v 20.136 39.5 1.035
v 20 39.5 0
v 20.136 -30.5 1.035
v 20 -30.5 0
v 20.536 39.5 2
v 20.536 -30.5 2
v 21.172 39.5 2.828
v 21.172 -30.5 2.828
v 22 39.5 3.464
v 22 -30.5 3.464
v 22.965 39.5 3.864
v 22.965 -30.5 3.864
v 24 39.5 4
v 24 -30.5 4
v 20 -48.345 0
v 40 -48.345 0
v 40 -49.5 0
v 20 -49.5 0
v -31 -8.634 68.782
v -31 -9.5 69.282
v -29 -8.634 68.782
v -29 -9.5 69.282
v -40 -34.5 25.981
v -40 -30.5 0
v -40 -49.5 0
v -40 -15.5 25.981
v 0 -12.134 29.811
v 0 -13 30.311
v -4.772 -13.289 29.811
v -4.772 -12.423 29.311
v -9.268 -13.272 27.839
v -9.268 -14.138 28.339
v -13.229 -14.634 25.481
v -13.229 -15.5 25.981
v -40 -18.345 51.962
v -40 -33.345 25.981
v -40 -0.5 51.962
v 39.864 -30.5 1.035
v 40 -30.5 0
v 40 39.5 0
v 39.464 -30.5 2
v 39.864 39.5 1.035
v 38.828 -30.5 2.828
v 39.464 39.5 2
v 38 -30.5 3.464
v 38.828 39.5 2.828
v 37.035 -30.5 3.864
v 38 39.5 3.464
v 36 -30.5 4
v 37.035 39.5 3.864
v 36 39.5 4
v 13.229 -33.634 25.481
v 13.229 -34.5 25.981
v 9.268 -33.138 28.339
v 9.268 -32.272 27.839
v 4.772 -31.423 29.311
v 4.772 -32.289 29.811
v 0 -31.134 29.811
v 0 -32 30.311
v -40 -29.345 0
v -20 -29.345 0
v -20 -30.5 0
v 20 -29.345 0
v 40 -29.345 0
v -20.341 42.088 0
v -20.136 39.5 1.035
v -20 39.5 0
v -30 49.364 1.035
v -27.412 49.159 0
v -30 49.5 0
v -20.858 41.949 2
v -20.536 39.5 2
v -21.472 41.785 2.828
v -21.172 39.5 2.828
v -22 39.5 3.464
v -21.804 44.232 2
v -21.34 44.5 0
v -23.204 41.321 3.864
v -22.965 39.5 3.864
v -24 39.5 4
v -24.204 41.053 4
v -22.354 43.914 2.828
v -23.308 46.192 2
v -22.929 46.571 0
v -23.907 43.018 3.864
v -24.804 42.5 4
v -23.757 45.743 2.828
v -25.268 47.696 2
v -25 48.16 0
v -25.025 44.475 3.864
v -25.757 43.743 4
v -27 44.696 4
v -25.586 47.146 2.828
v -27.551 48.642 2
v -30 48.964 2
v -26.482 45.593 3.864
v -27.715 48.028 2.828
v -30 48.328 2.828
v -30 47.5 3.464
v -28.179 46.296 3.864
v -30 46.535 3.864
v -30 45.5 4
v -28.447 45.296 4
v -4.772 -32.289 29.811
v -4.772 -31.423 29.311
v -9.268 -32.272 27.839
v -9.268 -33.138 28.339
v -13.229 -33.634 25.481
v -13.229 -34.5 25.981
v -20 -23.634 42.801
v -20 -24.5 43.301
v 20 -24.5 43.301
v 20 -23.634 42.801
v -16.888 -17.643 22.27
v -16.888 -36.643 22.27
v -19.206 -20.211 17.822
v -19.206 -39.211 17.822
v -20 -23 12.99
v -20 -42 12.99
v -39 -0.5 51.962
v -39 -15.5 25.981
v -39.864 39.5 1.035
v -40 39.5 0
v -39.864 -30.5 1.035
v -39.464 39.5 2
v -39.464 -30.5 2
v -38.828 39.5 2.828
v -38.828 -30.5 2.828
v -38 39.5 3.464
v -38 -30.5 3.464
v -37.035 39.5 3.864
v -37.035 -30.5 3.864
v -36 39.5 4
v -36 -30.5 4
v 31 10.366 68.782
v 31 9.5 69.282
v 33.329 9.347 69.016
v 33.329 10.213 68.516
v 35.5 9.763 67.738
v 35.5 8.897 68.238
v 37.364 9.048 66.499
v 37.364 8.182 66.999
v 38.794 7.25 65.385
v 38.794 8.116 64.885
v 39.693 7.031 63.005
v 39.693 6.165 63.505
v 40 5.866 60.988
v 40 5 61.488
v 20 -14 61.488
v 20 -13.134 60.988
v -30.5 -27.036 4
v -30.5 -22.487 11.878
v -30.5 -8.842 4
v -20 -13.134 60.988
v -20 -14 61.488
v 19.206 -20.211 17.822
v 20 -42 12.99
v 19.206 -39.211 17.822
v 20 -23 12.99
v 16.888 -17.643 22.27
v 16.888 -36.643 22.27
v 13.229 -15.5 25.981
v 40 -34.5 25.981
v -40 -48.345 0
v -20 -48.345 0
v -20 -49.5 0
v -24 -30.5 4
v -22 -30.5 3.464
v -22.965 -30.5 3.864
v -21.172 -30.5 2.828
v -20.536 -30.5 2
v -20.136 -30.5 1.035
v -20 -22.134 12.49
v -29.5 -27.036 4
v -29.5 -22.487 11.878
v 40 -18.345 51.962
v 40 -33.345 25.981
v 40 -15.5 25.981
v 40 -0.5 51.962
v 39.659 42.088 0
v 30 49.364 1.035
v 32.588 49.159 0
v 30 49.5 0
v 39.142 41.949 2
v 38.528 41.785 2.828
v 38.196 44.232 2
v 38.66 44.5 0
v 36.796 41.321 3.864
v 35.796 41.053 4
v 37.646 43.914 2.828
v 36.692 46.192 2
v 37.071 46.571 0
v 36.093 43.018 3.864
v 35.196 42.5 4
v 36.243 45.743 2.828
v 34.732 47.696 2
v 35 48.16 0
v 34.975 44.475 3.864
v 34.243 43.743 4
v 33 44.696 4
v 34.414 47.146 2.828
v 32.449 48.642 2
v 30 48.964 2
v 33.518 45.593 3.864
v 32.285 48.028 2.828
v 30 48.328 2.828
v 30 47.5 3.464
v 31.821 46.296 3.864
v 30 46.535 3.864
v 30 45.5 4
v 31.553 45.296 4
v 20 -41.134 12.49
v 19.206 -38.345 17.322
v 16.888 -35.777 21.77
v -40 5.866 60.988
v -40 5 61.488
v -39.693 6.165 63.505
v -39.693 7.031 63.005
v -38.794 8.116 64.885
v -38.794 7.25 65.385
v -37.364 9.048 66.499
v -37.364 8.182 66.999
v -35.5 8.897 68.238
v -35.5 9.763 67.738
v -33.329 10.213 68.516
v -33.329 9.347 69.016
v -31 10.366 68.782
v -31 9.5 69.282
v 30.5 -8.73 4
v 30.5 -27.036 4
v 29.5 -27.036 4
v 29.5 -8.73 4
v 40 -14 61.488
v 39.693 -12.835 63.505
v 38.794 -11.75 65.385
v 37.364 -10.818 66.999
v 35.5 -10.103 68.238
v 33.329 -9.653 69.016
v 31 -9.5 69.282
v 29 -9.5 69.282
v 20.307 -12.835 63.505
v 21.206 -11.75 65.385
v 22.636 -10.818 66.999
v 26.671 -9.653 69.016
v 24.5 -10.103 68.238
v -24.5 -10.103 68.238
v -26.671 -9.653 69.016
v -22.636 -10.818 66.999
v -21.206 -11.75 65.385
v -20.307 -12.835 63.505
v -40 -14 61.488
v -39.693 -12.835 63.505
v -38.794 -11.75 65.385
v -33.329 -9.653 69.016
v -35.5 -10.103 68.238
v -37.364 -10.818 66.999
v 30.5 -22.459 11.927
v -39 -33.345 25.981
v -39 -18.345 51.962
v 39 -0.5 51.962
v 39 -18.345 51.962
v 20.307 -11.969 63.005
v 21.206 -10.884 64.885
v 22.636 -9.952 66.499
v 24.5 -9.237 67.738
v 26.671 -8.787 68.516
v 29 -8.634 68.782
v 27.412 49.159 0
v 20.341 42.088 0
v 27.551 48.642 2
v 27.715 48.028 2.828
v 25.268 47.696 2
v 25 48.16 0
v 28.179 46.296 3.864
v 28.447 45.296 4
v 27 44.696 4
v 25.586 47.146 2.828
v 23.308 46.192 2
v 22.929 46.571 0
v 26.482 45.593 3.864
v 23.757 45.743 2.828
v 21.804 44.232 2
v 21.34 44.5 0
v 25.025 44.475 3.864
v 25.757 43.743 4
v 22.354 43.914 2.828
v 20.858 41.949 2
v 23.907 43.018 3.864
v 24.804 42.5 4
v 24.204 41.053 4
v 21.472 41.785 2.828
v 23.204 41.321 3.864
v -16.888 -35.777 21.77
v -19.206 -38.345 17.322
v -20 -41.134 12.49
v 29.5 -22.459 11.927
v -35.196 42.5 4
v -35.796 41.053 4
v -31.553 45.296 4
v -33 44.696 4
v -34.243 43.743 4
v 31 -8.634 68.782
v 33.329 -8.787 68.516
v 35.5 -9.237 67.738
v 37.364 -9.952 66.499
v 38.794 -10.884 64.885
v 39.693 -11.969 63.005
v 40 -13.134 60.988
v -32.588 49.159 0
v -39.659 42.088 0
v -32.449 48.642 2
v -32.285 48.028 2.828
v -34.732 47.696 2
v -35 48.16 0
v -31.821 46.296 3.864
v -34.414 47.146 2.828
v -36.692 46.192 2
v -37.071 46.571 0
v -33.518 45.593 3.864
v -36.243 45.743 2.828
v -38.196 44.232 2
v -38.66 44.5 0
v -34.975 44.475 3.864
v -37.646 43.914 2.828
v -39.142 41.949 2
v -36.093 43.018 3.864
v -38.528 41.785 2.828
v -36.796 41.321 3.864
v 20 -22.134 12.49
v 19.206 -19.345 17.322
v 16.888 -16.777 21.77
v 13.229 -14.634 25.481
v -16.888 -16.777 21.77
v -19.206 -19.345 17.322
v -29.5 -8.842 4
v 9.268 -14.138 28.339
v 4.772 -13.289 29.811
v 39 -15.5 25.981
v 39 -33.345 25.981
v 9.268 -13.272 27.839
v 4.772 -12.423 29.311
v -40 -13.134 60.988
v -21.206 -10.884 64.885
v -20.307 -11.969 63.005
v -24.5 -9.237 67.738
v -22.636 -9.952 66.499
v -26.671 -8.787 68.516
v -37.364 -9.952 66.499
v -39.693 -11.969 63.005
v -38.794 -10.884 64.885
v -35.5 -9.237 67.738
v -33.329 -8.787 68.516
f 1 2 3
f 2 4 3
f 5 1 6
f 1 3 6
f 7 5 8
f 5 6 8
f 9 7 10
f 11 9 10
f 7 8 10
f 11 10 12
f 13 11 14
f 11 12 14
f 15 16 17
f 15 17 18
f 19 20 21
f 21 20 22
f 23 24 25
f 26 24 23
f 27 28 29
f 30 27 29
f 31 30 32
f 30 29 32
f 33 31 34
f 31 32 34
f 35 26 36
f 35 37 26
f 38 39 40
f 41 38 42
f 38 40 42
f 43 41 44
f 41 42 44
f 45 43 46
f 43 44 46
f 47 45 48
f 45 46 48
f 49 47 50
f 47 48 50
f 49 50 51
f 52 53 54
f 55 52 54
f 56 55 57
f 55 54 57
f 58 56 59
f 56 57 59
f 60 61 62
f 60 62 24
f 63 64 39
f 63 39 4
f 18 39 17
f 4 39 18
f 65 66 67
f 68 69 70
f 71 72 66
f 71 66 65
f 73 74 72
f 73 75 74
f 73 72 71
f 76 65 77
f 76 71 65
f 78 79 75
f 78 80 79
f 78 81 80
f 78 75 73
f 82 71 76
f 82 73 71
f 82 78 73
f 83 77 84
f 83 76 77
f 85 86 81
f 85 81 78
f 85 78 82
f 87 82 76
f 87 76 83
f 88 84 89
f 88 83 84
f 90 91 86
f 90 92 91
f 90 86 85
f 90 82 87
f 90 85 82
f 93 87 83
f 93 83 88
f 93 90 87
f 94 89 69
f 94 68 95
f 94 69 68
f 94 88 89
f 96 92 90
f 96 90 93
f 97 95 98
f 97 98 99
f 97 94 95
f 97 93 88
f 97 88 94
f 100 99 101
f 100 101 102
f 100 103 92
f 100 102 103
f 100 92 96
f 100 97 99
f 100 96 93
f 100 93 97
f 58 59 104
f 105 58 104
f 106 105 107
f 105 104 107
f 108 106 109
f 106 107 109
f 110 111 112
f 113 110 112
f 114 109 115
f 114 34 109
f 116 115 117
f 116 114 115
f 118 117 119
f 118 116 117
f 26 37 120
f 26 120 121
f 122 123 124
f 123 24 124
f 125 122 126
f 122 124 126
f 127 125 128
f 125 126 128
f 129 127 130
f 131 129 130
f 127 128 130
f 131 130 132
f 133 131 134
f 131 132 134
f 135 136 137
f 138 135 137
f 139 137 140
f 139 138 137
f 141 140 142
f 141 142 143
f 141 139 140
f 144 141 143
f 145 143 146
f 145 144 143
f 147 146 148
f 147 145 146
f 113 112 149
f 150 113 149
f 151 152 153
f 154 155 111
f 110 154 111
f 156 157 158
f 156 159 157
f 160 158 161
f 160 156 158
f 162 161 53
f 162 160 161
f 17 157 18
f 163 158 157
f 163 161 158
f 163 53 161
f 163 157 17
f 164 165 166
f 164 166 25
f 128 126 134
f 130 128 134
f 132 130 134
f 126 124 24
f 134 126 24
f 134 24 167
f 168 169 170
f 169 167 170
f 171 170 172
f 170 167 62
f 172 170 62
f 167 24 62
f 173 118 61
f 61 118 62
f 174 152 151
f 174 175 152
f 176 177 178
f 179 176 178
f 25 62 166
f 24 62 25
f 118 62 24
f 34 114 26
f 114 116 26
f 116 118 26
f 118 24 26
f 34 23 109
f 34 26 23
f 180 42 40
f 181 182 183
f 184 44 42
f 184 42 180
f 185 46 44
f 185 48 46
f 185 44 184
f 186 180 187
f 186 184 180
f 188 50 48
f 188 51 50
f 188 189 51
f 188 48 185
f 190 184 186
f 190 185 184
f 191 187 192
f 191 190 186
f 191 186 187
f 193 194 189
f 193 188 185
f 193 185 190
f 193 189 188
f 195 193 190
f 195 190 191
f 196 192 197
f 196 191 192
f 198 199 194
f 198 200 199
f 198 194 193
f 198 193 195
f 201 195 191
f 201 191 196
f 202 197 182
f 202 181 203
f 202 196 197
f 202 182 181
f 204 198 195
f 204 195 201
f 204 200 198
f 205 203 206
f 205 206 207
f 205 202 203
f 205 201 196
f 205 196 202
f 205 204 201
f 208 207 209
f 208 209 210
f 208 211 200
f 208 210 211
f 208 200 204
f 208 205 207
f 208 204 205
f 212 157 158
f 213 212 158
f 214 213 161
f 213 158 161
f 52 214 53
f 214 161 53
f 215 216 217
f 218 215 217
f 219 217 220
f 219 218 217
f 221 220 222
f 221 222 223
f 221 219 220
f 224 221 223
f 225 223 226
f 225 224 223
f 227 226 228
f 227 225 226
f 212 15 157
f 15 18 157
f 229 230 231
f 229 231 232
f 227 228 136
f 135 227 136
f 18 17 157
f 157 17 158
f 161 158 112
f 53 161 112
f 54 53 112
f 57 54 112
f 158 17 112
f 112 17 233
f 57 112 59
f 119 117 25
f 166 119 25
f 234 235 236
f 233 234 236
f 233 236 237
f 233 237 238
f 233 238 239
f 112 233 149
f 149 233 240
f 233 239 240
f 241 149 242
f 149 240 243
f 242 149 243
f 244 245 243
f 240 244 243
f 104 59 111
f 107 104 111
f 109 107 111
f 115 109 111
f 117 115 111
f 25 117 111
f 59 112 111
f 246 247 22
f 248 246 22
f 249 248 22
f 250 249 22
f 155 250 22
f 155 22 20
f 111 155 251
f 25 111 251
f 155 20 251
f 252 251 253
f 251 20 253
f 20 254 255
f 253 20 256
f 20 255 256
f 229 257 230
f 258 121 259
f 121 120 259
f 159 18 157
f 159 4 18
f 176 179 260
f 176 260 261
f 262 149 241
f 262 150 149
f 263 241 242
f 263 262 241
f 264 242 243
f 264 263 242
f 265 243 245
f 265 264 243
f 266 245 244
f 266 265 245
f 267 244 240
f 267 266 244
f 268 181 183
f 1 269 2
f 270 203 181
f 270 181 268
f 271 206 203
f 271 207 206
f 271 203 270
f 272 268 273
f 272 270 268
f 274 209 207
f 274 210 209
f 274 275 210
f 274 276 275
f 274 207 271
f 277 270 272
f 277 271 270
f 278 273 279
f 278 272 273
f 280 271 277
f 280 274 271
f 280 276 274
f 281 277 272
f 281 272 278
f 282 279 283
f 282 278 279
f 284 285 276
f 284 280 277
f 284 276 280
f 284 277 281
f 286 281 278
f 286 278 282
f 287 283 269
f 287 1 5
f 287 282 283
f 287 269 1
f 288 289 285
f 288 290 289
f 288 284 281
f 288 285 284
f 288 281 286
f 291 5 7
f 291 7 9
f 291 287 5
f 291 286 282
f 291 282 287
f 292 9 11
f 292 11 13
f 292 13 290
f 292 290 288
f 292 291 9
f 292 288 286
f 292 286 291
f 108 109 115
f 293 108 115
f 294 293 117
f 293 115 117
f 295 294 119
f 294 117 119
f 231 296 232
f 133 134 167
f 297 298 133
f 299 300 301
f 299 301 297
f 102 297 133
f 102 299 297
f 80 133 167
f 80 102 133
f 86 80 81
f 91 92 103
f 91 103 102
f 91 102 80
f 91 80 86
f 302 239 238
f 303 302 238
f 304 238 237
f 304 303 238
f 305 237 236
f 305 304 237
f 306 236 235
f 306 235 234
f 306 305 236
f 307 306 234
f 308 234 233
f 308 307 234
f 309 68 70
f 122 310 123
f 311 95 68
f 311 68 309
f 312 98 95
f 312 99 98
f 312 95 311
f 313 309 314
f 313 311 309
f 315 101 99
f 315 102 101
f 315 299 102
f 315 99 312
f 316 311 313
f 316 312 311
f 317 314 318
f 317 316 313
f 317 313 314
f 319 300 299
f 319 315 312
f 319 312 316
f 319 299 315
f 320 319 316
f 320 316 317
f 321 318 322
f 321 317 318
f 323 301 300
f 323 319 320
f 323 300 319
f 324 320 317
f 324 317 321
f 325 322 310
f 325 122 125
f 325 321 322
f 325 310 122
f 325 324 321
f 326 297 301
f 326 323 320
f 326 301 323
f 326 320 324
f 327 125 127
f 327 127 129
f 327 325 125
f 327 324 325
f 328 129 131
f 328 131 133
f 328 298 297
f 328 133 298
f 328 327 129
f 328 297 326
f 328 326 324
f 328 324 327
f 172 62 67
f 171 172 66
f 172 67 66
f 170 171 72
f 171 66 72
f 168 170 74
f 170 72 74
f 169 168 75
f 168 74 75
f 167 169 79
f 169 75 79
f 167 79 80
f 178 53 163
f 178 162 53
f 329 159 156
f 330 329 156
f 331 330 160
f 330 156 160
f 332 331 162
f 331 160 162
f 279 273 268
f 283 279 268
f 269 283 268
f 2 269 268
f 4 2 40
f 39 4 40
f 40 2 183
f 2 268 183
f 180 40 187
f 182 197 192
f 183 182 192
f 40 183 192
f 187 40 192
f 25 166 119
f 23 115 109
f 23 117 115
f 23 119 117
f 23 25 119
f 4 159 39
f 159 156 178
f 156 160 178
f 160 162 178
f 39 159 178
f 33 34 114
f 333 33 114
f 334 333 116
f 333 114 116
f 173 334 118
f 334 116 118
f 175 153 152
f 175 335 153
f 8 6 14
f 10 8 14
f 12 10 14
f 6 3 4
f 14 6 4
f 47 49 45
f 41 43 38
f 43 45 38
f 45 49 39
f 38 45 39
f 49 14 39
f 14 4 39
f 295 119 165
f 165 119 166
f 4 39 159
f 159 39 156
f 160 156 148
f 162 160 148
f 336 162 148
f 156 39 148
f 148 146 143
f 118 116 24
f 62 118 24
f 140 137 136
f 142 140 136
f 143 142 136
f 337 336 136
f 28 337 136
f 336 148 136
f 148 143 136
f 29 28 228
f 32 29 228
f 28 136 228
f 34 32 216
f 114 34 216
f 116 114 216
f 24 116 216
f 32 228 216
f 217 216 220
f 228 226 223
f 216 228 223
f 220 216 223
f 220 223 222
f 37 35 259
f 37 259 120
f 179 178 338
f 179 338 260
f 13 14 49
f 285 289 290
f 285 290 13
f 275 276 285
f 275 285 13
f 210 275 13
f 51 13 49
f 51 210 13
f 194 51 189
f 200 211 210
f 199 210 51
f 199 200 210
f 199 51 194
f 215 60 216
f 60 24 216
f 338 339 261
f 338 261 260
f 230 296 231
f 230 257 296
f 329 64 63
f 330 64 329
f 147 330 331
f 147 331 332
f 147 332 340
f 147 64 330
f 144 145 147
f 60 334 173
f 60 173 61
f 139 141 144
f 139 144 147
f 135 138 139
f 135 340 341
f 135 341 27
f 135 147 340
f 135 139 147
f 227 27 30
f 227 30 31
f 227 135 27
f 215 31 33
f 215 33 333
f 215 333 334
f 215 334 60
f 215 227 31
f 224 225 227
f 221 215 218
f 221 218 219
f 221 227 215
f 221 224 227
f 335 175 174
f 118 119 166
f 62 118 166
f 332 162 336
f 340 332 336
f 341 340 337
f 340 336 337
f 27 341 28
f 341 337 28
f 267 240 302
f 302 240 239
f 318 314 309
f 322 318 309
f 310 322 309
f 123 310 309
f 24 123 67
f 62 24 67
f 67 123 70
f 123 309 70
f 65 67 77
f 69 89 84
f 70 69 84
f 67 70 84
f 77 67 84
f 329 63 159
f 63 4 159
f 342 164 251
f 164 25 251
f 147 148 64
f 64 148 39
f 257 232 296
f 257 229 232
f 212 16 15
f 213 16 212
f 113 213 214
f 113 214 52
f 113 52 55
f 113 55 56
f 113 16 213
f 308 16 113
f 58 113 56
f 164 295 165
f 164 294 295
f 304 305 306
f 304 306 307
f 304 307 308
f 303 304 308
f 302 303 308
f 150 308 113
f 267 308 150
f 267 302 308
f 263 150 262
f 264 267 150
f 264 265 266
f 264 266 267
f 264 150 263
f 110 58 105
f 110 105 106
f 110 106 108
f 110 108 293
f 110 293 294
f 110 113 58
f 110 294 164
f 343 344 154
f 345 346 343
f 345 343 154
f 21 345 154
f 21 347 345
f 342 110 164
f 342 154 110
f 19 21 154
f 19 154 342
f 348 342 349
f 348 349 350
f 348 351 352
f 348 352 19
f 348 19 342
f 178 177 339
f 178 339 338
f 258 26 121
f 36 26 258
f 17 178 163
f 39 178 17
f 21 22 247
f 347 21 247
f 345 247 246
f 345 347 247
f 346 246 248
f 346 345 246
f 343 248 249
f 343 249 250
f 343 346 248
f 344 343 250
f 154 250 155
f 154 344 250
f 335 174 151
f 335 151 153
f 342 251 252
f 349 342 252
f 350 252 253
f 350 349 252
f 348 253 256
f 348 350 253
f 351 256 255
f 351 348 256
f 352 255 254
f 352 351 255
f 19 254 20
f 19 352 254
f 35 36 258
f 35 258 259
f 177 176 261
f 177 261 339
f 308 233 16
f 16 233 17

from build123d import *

# Parameters (mm, degrees)
F5_DEPTH    = 4
F6_DEPTH    = 1
F7_DEPTH    = 1
F10_R       = 9
F10_2_R     = 9
F11_R       = 3.99999
F11_2_R     = 3.99999
F15_DEPTH   = 1
F17_DEPTH   = 1
F20_DEPTH   = 0.5
F21_SIZE2   = 0.57734
F21_SIZE    = 0.99999
F22_SIZE2   = 0.57734
F22_SIZE    = 0.99999
F22_2_SIZE2 = 0.57734
F22_2_SIZE  = 0.99999
F22_3_SIZE2 = 0.57734
F22_3_SIZE  = 0.99999
F25_DEPTH   = 0.5


# Not quite as in the source:
# - a fillet or chamfer is up to 0.001 mm smaller than in the source, because OpenCascade refuses the exact size
# - a feature names something its author has since deleted; it is built from what else it names


with BuildPart() as f5:
    # F0 (on Top) → F5 (new body)
    with BuildSketch(Plane.XY):
        with BuildLine():
            Line((20, 39.5), (20, -30.5))
            Line((20, -30.5), (40, -30.5))
            Line((40, -30.5), (40, 39.5))
            ThreePointArc((40, 39.5), (37.0710678119, 46.5710678119), (30, 49.5))
            ThreePointArc((30, 49.5), (22.9289321881, 46.5710678119), (20, 39.5))
        make_face()
    extrude(amount=F5_DEPTH)

    # F11 (radius 4 in the source; OpenCascade refuses exactly that, so slightly less here)
    f11_edges = [f5.edges().sort_by_distance(p)[0] for p in [
        (20, 4.5, 4),
        (40, 4.5, 4),
        (30, 49.5, 4),
    ]]
    fillet(f11_edges, radius=F11_R)


with BuildPart() as f5b:
    # F0 (on Top) → F5, piece 2 (new body)
    with BuildSketch(Plane.XY):
        with BuildLine():
            Line((-40, 39.5), (-40, -30.5))
            Line((-40, -30.5), (-20, -30.5))
            Line((-20, -30.5), (-20, 39.5))
            ThreePointArc((-20, 39.5), (-22.9289321881, 46.5710678119), (-30, 49.5))
            ThreePointArc((-30, 49.5), (-37.0710678119, 46.5710678119), (-40, 39.5))
        make_face()
    extrude(amount=F5_DEPTH)

    # F11#2 (radius 4 in the source; OpenCascade refuses exactly that, so slightly less here)
    f11_2_edges = [f5b.edges().sort_by_distance(p)[0] for p in [
        (-40, 4.5, 4),
        (-20, 4.5, 4),
        (-30, 49.5, 4),
    ]]
    fillet(f11_2_edges, radius=F11_2_R)


with BuildPart() as f6:
    # F4 (on line) → F6 (new body)
    with BuildSketch(Plane(origin=(0, -37.125, 21.4341287437), x_dir=(-1, 0, 0), z_dir=(0, 0.8660254038, -0.5))):
        with BuildLine():
            Line((-40, -24.75), (-20, -24.75))
            Line((-20, -24.75), (-20, -9.75))
            ThreePointArc((-20, -9.75), (-18.2287565553, -1.5212434447), (-13.2287565553, 5.25))
            Line((-13.2287565553, 5.25), (-40, 5.25))
            Line((-40, 5.25), (-40, -24.75))
        make_face()
        with BuildLine():
            Line((13.2287565553, 5.25), (40, 5.25))
            Line((40, 5.25), (40, 55.25))
            Line((40, 55.25), (20, 55.25))
            Line((20, 55.25), (20, 25.25))
            Line((20, 25.25), (-20, 25.25))
            Line((-20, 25.25), (-20, 55.25))
            Line((-20, 55.25), (-40, 55.25))
            Line((-40, 55.25), (-40, 5.25))
            Line((-40, 5.25), (-13.2287565553, 5.25))
            ThreePointArc((-13.2287565553, 5.25), (-7.0710678119, 8.9582869339), (0, 10.25))
            ThreePointArc((0, 10.25), (7.0710678119, 8.9582869339), (13.2287565553, 5.25))
        make_face()
        with BuildLine():
            Line((20, -24.75), (40, -24.75))
            Line((40, -24.75), (40, 5.25))
            Line((40, 5.25), (13.2287565553, 5.25))
            ThreePointArc((13.2287565553, 5.25), (18.2287565553, -1.5212434447), (20, -9.75))
            Line((20, -9.75), (20, -24.75))
        make_face()
    extrude(amount=F6_DEPTH)

    # F10
    f10_edges = [f6.edges().sort_by_distance(p)[0] for p in [
        (-40, -9.066987, 69.032032),
        (-20, -9.066987, 69.032032),
        (40, -9.066987, 69.032032),
        (20, -9.066987, 69.032032),
    ]]
    fillet(f10_edges, radius=F10_R)

    # F22#2 (size 1 and 0.5773502692 in the source; OpenCascade refuses exactly that, so slightly less here)
    f22_2_edges = [f6.edges().sort_by_distance(p)[0] for p in [
        (30, -48.633975, -0.5),
    ]]
    f22_2_side = f6.faces().sort_by_distance((30, -49.066987, -0.25))[0]
    chamfer(f22_2_edges, length=F22_2_SIZE, length2=F22_2_SIZE2, reference=f22_2_side)

    # F22#3 (size 1 and 0.5773502692 in the source; OpenCascade refuses exactly that, so slightly less here)
    f22_3_edges = [f6.edges().sort_by_distance(p)[0] for p in [
        (-30, -48.633975, -0.5),
    ]]
    f22_3_side = f6.faces().sort_by_distance((-30, -49.066987, -0.25))[0]
    chamfer(f22_3_edges, length=F22_3_SIZE, length2=F22_3_SIZE2, reference=f22_3_side)


with BuildPart() as f7:
    # F3 (on line) → F7 (new body)
    with BuildSketch(Plane(origin=(0, -22.875, 13.2068874077), x_dir=(-1, 0, 0), z_dir=(0, 0.8660254038, -0.5))):
        with BuildLine():
            Line((-40, -15.25), (-20, -15.25))
            Line((-20, -15.25), (-20, -0.25))
            ThreePointArc((-20, -0.25), (-18.2287565553, 7.9787565553), (-13.2287565553, 14.75))
            Line((-13.2287565553, 14.75), (-40, 14.75))
            Line((-40, 14.75), (-40, -15.25))
        make_face()
        with BuildLine():
            Line((20, -15.25), (40, -15.25))
            Line((40, -15.25), (40, 14.75))
            Line((40, 14.75), (13.2287565553, 14.75))
            ThreePointArc((13.2287565553, 14.75), (18.2287565553, 7.9787565553), (20, -0.25))
            Line((20, -0.25), (20, -15.25))
        make_face()
        with BuildLine():
            Line((13.2287565553, 14.75), (40, 14.75))
            Line((40, 14.75), (40, 64.75))
            Line((40, 64.75), (-40, 64.75))
            Line((-40, 64.75), (-40, 14.75))
            Line((-40, 14.75), (-13.2287565553, 14.75))
            ThreePointArc((-13.2287565553, 14.75), (-7.0710678119, 18.4582869339), (0, 19.75))
            ThreePointArc((0, 19.75), (7.0710678119, 18.4582869339), (13.2287565553, 14.75))
        make_face()
    extrude(amount=F7_DEPTH)

    # F10#2
    f10_2_edges = [f7.edges().sort_by_distance(p)[0] for p in [
        (40, 9.933013, 69.032032),
        (-40, 9.933013, 69.032032),
    ]]
    fillet(f10_2_edges, radius=F10_2_R)

    # F21 (size 1 and 0.5773502692 in the source; OpenCascade refuses exactly that, so slightly less here)
    f21_edges = [f7.edges().sort_by_distance(p)[0] for p in [
        (30, -29.633975, -0.5),
    ]]
    f21_side = f7.faces().sort_by_distance((30, -30.066987, -0.25))[0]
    chamfer(f21_edges, length=F21_SIZE, length2=F21_SIZE2, reference=f21_side)

    # F22 (size 1 and 0.5773502692 in the source; OpenCascade refuses exactly that, so slightly less here)
    f22_edges = [f7.edges().sort_by_distance(p)[0] for p in [
        (-30, -29.633975, -0.5),
    ]]
    f22_side = f7.faces().sort_by_distance((-30, -30.066987, -0.25))[0]
    chamfer(f22_edges, length=F22_SIZE, length2=F22_SIZE2, reference=f22_side)


with BuildPart() as f8:
    # F4 (on line) → F8 section 0
    with BuildSketch(Plane(origin=(0, -37.125, 21.4341287437), x_dir=(-1, 0, 0), z_dir=(0, 0.8660254038, -0.5))):
        with BuildLine():
            Line((-40, -24.75), (-20, -24.75))
            Line((-20, -24.75), (-20, -9.75))
            ThreePointArc((-20, -9.75), (-18.2287565553, -1.5212434447), (-13.2287565553, 5.25))
            Line((-13.2287565553, 5.25), (-40, 5.25))
            Line((-40, 5.25), (-40, -24.75))
        make_face()
    # F3 (on line) → F8 section 1
    with BuildSketch(Plane(origin=(0, -22.875, 13.2068874077), x_dir=(-1, 0, 0), z_dir=(0, 0.8660254038, -0.5))):
        with BuildLine():
            Line((-40, -15.25), (-20, -15.25))
            Line((-20, -15.25), (-20, -0.25))
            ThreePointArc((-20, -0.25), (-18.2287565553, 7.9787565553), (-13.2287565553, 14.75))
            Line((-13.2287565553, 14.75), (-40, 14.75))
            Line((-40, 14.75), (-40, -15.25))
        make_face()
    loft()


with BuildPart() as f9:
    # F4 (on line) → F9 section 0
    with BuildSketch(Plane(origin=(0, -37.125, 21.4341287437), x_dir=(-1, 0, 0), z_dir=(0, 0.8660254038, -0.5))):
        with BuildLine():
            Line((20, -24.75), (40, -24.75))
            Line((40, -24.75), (40, 5.25))
            Line((40, 5.25), (13.2287565553, 5.25))
            ThreePointArc((13.2287565553, 5.25), (18.2287565553, -1.5212434447), (20, -9.75))
            Line((20, -9.75), (20, -24.75))
        make_face()
    # F3 (on line) → F9 section 1
    with BuildSketch(Plane(origin=(0, -22.875, 13.2068874077), x_dir=(-1, 0, 0), z_dir=(0, 0.8660254038, -0.5))):
        with BuildLine():
            Line((20, -15.25), (40, -15.25))
            Line((40, -15.25), (40, 14.75))
            Line((40, 14.75), (13.2287565553, 14.75))
            ThreePointArc((13.2287565553, 14.75), (18.2287565553, 7.9787565553), (20, -0.25))
            Line((20, -0.25), (20, -15.25))
        make_face()
    loft()


with BuildPart() as f15:
    # F14 (on face) → F15 (new body)
    with BuildSketch(Plane(origin=(-40, 0, 0), x_dir=(0, -1, 0), z_dir=(-1, 0, 0))):
        Polygon((15.5, 25.9807621135), (33.3452994616, 25.9807621135), (18.3452994616, 51.9615242271), (0.5, 51.9615242271), align=None)
    extrude(amount=-F15_DEPTH)


with BuildPart() as f17:
    # F16 (on offset) → F17 (new body)
    with BuildSketch(Plane.YZ.offset(40)):
        Polygon((-18.3452994616, 51.9615242271), (-33.3452994616, 25.9807621135), (-15.5, 25.9807621135), (-0.5, 51.9615242271), align=None)
    extrude(amount=-F17_DEPTH)


with BuildPart() as f20:
    # F19 (on line) → F20 (new body, symmetric)
    with BuildSketch(Plane.YZ.offset(30)):
        Polygon((-22.4594569975, 11.9266290008), (-27.0358983849, 4), (-8.7301328353, 4), align=None)
    extrude(amount=F20_DEPTH, both=True)


with BuildPart() as f25:
    # F24 (on line) → F25 (new body, symmetric)
    with BuildSketch(Plane.YZ.offset(-30)):
        Polygon((-22.4873672427, 11.878287038), (-27.0358983849, 4), (-8.8417738163, 4), align=None)
    extrude(amount=F25_DEPTH, both=True)


solid = Compound([f5.part, f5b.part, f6.part, f7.part, f8.part, f9.part, f15.part, f17.part, f20.part, f25.part])
